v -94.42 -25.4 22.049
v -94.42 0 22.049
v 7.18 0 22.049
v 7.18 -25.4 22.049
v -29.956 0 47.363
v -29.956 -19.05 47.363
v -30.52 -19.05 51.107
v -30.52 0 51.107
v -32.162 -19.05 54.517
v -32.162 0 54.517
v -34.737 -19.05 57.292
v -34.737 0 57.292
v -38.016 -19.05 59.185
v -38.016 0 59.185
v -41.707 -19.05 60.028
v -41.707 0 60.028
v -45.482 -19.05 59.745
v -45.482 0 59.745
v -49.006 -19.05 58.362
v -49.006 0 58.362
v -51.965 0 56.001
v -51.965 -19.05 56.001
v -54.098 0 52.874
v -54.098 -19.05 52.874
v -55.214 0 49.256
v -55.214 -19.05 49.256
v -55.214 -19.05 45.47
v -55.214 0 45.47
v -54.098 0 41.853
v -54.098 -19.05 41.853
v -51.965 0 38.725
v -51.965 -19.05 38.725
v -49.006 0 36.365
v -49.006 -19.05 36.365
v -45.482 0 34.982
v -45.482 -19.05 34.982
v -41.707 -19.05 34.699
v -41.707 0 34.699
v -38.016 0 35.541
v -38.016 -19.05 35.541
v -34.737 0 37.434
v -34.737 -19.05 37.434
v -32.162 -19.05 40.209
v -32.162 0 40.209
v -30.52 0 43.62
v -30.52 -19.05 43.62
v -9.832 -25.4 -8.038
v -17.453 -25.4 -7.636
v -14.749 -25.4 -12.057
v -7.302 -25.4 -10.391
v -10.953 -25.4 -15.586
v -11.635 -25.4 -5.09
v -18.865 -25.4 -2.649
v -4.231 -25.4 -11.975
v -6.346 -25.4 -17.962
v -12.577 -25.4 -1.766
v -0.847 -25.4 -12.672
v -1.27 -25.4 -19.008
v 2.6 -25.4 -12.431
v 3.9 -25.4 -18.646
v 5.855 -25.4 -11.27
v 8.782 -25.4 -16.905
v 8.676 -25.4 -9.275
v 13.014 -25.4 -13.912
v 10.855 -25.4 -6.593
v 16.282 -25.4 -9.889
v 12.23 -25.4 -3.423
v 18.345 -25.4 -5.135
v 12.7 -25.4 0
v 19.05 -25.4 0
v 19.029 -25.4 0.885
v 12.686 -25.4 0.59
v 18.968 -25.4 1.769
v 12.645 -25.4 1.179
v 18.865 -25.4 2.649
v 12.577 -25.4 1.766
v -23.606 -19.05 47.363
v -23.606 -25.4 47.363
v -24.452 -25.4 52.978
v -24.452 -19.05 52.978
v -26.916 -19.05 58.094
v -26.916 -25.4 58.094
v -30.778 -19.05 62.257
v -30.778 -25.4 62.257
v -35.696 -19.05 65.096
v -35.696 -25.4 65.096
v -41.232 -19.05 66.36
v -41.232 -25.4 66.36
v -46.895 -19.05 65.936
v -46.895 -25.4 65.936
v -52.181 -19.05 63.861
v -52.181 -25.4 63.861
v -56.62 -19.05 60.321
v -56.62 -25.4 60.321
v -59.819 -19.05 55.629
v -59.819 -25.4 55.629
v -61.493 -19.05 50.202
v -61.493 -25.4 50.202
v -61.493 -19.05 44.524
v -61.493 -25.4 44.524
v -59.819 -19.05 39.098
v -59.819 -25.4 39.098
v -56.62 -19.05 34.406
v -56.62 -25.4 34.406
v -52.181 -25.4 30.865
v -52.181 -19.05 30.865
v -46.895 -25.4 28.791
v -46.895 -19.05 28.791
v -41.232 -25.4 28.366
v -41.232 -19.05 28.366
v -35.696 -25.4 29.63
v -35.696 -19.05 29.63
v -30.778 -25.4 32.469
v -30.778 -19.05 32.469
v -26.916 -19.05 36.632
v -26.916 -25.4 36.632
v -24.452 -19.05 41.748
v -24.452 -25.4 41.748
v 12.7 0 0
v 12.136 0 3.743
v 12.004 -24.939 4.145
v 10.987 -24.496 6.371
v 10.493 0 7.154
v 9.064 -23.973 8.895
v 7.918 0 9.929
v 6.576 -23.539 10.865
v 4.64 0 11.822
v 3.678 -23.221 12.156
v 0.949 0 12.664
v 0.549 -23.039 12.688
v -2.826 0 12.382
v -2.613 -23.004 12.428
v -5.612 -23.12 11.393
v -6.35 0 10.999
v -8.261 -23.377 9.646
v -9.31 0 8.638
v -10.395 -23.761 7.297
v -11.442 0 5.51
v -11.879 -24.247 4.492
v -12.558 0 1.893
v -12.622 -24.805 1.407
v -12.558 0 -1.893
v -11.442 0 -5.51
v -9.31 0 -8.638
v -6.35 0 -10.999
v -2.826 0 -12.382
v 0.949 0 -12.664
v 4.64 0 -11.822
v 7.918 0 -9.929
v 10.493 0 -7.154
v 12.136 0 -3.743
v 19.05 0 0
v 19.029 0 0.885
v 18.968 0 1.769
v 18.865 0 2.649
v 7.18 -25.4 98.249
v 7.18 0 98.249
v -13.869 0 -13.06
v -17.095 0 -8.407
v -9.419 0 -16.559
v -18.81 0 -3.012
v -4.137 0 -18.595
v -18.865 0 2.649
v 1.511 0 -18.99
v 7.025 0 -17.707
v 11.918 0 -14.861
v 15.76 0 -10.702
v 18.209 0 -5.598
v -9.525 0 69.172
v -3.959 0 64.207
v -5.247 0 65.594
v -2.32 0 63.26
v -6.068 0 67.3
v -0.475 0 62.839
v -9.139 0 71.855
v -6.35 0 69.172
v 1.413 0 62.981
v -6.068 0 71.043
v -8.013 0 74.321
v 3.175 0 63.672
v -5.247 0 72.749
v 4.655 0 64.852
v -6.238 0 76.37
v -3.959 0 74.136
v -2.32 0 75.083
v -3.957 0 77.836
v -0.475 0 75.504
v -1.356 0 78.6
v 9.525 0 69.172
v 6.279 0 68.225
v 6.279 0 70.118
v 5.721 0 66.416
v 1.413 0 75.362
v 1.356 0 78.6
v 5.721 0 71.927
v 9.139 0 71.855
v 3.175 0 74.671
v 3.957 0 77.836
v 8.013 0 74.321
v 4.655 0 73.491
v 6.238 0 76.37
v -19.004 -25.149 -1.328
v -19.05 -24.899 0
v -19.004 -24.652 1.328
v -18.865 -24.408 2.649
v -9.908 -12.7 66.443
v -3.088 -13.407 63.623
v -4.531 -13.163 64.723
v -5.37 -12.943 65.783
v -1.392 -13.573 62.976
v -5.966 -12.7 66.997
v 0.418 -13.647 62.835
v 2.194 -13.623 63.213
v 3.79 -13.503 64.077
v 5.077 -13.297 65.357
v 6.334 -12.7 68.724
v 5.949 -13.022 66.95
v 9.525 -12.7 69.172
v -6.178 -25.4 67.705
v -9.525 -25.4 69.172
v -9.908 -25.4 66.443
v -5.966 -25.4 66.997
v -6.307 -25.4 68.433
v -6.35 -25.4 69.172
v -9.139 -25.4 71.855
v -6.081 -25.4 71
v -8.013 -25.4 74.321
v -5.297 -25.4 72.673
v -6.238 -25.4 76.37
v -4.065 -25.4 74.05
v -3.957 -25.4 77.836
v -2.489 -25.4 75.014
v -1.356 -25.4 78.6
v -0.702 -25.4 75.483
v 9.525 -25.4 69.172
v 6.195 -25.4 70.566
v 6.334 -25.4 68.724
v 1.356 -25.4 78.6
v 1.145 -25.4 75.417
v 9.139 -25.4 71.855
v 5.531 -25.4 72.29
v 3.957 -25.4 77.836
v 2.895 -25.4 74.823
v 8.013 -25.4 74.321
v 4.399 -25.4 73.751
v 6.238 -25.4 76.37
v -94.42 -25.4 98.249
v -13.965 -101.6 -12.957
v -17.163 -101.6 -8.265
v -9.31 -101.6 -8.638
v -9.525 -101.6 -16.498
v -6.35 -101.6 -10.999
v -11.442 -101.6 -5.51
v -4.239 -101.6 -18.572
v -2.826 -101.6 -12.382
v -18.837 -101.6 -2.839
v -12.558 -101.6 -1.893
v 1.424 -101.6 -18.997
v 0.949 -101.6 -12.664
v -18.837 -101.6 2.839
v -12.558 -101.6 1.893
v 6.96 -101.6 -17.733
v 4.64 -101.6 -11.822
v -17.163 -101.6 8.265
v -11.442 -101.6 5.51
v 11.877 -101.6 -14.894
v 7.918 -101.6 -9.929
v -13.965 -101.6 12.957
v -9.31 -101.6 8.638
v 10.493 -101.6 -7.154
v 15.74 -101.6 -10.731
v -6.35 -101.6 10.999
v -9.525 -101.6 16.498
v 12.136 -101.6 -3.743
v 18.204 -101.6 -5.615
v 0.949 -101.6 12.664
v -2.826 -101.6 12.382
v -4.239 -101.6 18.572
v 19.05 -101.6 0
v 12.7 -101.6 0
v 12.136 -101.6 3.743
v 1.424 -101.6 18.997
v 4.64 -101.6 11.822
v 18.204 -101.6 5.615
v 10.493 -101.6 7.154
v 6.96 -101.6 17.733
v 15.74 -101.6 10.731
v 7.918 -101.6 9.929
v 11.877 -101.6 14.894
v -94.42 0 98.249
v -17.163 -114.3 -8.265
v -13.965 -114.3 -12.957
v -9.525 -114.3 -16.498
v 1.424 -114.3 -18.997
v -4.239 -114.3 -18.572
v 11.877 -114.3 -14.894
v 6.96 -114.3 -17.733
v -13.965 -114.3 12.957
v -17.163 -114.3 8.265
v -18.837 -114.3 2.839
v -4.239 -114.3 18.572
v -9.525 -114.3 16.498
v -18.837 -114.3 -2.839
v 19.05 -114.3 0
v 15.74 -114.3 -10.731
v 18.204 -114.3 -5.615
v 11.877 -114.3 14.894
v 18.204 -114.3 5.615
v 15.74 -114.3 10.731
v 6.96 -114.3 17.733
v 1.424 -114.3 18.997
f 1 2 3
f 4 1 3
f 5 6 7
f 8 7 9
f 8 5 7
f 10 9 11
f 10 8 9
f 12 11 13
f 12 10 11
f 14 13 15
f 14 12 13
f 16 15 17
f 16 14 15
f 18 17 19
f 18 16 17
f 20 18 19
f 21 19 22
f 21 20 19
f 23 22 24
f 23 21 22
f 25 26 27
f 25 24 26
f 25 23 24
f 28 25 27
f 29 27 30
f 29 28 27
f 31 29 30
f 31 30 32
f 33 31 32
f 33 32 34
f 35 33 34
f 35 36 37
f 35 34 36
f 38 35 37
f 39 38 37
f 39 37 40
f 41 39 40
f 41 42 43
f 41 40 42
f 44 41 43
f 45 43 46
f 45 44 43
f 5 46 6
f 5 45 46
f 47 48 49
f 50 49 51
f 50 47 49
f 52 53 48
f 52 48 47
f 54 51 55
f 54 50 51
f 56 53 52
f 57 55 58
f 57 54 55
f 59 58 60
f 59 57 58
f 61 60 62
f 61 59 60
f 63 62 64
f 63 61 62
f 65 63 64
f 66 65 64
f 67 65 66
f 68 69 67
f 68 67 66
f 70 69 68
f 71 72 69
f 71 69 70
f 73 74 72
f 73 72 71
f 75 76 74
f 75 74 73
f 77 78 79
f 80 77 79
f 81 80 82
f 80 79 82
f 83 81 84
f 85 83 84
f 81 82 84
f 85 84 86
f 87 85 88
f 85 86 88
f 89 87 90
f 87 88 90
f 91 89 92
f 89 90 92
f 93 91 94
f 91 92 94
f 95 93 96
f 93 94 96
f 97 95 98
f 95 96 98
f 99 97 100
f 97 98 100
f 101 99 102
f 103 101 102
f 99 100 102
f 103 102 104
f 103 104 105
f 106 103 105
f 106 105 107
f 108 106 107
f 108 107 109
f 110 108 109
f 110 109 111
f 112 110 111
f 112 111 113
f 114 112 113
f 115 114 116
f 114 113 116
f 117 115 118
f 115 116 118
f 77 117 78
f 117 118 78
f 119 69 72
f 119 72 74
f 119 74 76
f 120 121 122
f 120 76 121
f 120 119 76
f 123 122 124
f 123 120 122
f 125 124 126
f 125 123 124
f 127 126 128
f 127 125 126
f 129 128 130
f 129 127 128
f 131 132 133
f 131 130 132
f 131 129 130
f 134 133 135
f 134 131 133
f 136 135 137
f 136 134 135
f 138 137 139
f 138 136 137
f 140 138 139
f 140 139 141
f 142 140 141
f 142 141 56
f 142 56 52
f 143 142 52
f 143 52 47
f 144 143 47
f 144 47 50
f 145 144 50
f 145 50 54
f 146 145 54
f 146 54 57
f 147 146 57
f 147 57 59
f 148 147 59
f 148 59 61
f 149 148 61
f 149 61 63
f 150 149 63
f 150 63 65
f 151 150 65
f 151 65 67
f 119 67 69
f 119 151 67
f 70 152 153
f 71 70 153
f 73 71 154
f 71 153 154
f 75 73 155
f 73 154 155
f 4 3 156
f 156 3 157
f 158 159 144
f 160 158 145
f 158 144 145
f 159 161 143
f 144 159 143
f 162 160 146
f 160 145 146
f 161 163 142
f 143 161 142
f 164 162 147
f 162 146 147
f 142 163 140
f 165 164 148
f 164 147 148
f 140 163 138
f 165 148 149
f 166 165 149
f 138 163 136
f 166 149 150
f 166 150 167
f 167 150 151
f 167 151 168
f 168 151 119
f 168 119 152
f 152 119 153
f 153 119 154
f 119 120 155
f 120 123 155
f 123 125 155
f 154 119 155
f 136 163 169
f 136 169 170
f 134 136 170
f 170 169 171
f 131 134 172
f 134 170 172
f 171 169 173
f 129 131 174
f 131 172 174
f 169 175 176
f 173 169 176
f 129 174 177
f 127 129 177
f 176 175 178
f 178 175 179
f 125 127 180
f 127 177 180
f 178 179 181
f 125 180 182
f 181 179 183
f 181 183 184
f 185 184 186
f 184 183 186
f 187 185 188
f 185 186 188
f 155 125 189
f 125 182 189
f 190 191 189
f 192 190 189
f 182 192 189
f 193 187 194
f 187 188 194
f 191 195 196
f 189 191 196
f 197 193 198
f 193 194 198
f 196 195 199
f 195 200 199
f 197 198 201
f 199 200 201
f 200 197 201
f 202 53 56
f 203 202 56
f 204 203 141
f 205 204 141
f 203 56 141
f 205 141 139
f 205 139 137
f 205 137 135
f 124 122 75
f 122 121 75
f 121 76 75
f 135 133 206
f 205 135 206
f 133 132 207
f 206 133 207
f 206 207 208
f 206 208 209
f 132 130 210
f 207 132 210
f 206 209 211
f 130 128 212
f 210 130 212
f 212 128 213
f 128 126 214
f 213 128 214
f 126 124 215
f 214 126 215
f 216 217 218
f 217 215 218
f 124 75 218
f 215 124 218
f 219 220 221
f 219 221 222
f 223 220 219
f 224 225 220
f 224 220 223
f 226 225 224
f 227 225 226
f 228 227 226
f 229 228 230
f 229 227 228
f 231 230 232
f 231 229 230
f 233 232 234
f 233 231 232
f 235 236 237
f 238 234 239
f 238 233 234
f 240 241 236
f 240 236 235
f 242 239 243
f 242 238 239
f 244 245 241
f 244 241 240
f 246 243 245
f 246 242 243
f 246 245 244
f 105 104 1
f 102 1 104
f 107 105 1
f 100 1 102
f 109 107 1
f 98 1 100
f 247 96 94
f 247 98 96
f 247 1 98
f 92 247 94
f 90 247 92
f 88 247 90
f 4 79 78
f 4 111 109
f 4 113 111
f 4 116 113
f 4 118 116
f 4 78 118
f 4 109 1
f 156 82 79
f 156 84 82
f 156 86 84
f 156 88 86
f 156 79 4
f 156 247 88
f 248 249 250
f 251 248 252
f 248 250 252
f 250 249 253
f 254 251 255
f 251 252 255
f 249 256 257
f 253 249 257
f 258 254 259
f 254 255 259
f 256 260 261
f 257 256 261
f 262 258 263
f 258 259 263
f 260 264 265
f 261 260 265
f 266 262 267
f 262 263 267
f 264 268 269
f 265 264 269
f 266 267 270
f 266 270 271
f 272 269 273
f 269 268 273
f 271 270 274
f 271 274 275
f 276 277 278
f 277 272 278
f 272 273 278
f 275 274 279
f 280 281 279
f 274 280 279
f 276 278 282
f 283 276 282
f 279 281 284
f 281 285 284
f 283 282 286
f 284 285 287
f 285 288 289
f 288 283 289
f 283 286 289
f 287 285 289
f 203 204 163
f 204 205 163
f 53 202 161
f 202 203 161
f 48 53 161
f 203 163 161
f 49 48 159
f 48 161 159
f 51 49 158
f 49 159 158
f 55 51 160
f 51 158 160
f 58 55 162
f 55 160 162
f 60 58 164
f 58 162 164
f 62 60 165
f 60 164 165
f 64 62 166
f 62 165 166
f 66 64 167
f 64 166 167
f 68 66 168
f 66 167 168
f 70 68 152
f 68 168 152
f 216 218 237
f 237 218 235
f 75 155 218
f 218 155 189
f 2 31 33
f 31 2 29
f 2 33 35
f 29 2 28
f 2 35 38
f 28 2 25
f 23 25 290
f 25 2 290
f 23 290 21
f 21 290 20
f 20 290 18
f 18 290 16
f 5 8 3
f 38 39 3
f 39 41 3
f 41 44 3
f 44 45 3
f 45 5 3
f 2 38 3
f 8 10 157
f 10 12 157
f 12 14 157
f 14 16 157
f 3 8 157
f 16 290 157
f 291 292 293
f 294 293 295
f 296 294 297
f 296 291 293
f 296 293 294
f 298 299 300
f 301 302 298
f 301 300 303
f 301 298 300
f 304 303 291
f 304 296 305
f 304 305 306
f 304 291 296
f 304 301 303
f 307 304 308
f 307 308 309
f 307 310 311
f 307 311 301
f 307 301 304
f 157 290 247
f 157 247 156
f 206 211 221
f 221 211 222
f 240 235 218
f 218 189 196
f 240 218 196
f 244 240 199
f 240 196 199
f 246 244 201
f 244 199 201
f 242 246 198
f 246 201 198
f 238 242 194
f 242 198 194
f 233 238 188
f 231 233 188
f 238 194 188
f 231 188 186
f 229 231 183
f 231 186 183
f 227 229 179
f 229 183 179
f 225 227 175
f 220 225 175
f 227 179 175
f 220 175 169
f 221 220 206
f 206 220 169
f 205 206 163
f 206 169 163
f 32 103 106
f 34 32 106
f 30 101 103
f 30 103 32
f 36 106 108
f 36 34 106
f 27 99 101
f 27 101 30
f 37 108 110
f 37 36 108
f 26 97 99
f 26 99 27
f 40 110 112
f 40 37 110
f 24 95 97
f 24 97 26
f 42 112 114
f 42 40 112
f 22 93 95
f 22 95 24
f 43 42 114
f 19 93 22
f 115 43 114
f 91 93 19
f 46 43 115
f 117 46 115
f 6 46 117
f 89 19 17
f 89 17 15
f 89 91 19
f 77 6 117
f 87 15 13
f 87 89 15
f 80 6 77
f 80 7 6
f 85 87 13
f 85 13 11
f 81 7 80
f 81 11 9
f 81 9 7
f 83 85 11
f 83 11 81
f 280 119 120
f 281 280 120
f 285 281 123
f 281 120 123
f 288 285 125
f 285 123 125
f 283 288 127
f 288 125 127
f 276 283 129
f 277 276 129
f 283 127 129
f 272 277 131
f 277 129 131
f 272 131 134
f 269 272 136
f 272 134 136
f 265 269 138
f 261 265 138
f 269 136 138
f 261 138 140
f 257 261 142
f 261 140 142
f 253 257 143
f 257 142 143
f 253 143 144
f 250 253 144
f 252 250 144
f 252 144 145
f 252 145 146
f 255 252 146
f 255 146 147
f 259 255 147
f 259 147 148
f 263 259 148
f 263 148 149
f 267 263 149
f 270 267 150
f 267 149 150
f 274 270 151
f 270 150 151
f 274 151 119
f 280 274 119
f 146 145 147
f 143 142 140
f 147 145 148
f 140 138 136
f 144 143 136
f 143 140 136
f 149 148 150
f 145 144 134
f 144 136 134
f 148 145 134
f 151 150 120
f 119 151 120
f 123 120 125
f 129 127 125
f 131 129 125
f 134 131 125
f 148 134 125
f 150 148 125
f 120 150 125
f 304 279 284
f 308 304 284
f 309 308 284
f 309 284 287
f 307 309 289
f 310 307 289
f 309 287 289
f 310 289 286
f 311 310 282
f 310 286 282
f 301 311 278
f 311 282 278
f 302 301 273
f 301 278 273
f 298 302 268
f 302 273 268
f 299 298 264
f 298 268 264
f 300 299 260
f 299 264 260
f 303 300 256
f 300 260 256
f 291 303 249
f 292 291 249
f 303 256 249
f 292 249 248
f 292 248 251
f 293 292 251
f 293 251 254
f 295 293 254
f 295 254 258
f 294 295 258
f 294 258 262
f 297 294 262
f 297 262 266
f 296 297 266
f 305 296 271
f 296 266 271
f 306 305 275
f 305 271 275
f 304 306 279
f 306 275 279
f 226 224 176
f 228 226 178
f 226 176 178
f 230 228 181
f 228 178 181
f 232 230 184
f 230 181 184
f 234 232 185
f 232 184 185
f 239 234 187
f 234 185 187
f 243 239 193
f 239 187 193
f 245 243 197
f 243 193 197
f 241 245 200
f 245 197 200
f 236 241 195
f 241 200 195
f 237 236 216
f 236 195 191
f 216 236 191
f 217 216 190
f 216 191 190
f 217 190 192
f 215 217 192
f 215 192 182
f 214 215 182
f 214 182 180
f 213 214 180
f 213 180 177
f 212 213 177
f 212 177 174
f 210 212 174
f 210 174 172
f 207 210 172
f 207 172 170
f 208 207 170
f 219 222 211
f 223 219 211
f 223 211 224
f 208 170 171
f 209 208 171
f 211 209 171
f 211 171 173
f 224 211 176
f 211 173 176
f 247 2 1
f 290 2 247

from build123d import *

# Parameters (mm, degrees)
F0_R      = 12.7
F1_DEPTH  = 101.6
F2_W      = 101.6
F2_H      = 76.2
F2_R      = 12.7
F3_DEPTH  = 25.4
F4_R      = 19.05
F5_DEPTH  = 12.7
F6_R      = 19.05
F7_DEPTH  = 6.35
F8_R      = 12.7
F9_DEPTH  = 25.4
F11_DEPTH = 115.2023226911


with BuildPart() as f1:
    # F0 (on Front) → F1 (new body)
    with BuildSketch(Plane.XZ):
        Circle(F0_R)
    extrude(amount=F1_DEPTH)

    # F4 (on face) → F5 (join)
    with BuildSketch(Plane.XZ.offset(101.6)):
        Circle(F4_R)
    extrude(amount=F5_DEPTH)


with BuildPart() as f3:
    # F2 (on Front) → F3 (new body)
    with BuildSketch(Plane.XZ):
        with Locations((-43.6197396773, 60.1487620682)):
            Rectangle(F2_W, F2_H)
        with Locations((-42.6556950318, 47.3632244934)):
            Circle(F2_R, mode=Mode.SUBTRACT)
    extrude(amount=F3_DEPTH)

    # F6 (on face) → F7 (cut)
    with BuildSketch(Plane.XZ.offset(25.4)):
        with Locations((-42.6556950318, 47.3632244934)):
            Circle(F6_R)
    extrude(amount=-F7_DEPTH, mode=Mode.SUBTRACT)


with BuildPart() as f9:
    # F8 (on Front) → F9 (new body)
    with BuildSketch(Plane.XZ):
        with BuildLine():
            ThreePointArc((-18.8649665496, 2.6486859164), (-1.3275705689, -19.0036853369), (19.05, 0))
            ThreePointArc((19.05, 0), (19.0036853383, 1.3275705492), (18.8649665551, 2.6486858773))
            ThreePointArc((18.8649665551, 2.6486858773), (1.98e-08, 19.05), (-18.8649665496, 2.6486859164))
        make_face()
        Circle(F8_R, mode=Mode.SUBTRACT)
        with BuildLine():
            ThreePointArc((-18.8649665496, 2.6486859164), (1.98e-08, 19.05), (18.8649665551, 2.6486858773))
            Line((18.8649665551, 2.6486858773), (9.525, 69.1715440215))
            ThreePointArc((9.525, 69.1715440215), (0, 59.6465440215), (-9.525, 69.1715440215))
            Line((-9.525, 69.1715440215), (-18.8649665496, 2.6486859164))
        make_face()
        with BuildLine():
            Line((6.35, 69.1715440215), (9.525, 69.1715440215))
            ThreePointArc((9.525, 69.1715440215), (0, 78.6965440215), (-9.525, 69.1715440215))
            Line((-9.525, 69.1715440215), (-6.35, 69.1715440215))
            ThreePointArc((-6.35, 69.1715440215), (0, 75.5215440215), (6.35, 69.1715440215))
        make_face()
        with BuildLine():
            ThreePointArc((-9.525, 69.1715440215), (0, 59.6465440215), (9.525, 69.1715440215))
            Line((9.525, 69.1715440215), (6.35, 69.1715440215))
            ThreePointArc((6.35, 69.1715440215), (0, 62.8215440215), (-6.35, 69.1715440215))
            Line((-6.35, 69.1715440215), (-9.525, 69.1715440215))
        make_face()
    extrude(amount=F9_DEPTH)

    # F10 (on face) → F11 (cut, through all)
    with BuildSketch(Plane(origin=(18.8649665513, 0, 2.6486859039), x_dir=(0, 1, 0), z_dir=(0.9902869581, 0, 0.1390386301))):
        Polygon((-25.4, 0), (-12.7, 67.1753349625), (-25.4, 67.1753349625), align=None)
    extrude(amount=-F11_DEPTH, mode=Mode.SUBTRACT)


solid = Compound([f1.part, f3.part, f9.part])
